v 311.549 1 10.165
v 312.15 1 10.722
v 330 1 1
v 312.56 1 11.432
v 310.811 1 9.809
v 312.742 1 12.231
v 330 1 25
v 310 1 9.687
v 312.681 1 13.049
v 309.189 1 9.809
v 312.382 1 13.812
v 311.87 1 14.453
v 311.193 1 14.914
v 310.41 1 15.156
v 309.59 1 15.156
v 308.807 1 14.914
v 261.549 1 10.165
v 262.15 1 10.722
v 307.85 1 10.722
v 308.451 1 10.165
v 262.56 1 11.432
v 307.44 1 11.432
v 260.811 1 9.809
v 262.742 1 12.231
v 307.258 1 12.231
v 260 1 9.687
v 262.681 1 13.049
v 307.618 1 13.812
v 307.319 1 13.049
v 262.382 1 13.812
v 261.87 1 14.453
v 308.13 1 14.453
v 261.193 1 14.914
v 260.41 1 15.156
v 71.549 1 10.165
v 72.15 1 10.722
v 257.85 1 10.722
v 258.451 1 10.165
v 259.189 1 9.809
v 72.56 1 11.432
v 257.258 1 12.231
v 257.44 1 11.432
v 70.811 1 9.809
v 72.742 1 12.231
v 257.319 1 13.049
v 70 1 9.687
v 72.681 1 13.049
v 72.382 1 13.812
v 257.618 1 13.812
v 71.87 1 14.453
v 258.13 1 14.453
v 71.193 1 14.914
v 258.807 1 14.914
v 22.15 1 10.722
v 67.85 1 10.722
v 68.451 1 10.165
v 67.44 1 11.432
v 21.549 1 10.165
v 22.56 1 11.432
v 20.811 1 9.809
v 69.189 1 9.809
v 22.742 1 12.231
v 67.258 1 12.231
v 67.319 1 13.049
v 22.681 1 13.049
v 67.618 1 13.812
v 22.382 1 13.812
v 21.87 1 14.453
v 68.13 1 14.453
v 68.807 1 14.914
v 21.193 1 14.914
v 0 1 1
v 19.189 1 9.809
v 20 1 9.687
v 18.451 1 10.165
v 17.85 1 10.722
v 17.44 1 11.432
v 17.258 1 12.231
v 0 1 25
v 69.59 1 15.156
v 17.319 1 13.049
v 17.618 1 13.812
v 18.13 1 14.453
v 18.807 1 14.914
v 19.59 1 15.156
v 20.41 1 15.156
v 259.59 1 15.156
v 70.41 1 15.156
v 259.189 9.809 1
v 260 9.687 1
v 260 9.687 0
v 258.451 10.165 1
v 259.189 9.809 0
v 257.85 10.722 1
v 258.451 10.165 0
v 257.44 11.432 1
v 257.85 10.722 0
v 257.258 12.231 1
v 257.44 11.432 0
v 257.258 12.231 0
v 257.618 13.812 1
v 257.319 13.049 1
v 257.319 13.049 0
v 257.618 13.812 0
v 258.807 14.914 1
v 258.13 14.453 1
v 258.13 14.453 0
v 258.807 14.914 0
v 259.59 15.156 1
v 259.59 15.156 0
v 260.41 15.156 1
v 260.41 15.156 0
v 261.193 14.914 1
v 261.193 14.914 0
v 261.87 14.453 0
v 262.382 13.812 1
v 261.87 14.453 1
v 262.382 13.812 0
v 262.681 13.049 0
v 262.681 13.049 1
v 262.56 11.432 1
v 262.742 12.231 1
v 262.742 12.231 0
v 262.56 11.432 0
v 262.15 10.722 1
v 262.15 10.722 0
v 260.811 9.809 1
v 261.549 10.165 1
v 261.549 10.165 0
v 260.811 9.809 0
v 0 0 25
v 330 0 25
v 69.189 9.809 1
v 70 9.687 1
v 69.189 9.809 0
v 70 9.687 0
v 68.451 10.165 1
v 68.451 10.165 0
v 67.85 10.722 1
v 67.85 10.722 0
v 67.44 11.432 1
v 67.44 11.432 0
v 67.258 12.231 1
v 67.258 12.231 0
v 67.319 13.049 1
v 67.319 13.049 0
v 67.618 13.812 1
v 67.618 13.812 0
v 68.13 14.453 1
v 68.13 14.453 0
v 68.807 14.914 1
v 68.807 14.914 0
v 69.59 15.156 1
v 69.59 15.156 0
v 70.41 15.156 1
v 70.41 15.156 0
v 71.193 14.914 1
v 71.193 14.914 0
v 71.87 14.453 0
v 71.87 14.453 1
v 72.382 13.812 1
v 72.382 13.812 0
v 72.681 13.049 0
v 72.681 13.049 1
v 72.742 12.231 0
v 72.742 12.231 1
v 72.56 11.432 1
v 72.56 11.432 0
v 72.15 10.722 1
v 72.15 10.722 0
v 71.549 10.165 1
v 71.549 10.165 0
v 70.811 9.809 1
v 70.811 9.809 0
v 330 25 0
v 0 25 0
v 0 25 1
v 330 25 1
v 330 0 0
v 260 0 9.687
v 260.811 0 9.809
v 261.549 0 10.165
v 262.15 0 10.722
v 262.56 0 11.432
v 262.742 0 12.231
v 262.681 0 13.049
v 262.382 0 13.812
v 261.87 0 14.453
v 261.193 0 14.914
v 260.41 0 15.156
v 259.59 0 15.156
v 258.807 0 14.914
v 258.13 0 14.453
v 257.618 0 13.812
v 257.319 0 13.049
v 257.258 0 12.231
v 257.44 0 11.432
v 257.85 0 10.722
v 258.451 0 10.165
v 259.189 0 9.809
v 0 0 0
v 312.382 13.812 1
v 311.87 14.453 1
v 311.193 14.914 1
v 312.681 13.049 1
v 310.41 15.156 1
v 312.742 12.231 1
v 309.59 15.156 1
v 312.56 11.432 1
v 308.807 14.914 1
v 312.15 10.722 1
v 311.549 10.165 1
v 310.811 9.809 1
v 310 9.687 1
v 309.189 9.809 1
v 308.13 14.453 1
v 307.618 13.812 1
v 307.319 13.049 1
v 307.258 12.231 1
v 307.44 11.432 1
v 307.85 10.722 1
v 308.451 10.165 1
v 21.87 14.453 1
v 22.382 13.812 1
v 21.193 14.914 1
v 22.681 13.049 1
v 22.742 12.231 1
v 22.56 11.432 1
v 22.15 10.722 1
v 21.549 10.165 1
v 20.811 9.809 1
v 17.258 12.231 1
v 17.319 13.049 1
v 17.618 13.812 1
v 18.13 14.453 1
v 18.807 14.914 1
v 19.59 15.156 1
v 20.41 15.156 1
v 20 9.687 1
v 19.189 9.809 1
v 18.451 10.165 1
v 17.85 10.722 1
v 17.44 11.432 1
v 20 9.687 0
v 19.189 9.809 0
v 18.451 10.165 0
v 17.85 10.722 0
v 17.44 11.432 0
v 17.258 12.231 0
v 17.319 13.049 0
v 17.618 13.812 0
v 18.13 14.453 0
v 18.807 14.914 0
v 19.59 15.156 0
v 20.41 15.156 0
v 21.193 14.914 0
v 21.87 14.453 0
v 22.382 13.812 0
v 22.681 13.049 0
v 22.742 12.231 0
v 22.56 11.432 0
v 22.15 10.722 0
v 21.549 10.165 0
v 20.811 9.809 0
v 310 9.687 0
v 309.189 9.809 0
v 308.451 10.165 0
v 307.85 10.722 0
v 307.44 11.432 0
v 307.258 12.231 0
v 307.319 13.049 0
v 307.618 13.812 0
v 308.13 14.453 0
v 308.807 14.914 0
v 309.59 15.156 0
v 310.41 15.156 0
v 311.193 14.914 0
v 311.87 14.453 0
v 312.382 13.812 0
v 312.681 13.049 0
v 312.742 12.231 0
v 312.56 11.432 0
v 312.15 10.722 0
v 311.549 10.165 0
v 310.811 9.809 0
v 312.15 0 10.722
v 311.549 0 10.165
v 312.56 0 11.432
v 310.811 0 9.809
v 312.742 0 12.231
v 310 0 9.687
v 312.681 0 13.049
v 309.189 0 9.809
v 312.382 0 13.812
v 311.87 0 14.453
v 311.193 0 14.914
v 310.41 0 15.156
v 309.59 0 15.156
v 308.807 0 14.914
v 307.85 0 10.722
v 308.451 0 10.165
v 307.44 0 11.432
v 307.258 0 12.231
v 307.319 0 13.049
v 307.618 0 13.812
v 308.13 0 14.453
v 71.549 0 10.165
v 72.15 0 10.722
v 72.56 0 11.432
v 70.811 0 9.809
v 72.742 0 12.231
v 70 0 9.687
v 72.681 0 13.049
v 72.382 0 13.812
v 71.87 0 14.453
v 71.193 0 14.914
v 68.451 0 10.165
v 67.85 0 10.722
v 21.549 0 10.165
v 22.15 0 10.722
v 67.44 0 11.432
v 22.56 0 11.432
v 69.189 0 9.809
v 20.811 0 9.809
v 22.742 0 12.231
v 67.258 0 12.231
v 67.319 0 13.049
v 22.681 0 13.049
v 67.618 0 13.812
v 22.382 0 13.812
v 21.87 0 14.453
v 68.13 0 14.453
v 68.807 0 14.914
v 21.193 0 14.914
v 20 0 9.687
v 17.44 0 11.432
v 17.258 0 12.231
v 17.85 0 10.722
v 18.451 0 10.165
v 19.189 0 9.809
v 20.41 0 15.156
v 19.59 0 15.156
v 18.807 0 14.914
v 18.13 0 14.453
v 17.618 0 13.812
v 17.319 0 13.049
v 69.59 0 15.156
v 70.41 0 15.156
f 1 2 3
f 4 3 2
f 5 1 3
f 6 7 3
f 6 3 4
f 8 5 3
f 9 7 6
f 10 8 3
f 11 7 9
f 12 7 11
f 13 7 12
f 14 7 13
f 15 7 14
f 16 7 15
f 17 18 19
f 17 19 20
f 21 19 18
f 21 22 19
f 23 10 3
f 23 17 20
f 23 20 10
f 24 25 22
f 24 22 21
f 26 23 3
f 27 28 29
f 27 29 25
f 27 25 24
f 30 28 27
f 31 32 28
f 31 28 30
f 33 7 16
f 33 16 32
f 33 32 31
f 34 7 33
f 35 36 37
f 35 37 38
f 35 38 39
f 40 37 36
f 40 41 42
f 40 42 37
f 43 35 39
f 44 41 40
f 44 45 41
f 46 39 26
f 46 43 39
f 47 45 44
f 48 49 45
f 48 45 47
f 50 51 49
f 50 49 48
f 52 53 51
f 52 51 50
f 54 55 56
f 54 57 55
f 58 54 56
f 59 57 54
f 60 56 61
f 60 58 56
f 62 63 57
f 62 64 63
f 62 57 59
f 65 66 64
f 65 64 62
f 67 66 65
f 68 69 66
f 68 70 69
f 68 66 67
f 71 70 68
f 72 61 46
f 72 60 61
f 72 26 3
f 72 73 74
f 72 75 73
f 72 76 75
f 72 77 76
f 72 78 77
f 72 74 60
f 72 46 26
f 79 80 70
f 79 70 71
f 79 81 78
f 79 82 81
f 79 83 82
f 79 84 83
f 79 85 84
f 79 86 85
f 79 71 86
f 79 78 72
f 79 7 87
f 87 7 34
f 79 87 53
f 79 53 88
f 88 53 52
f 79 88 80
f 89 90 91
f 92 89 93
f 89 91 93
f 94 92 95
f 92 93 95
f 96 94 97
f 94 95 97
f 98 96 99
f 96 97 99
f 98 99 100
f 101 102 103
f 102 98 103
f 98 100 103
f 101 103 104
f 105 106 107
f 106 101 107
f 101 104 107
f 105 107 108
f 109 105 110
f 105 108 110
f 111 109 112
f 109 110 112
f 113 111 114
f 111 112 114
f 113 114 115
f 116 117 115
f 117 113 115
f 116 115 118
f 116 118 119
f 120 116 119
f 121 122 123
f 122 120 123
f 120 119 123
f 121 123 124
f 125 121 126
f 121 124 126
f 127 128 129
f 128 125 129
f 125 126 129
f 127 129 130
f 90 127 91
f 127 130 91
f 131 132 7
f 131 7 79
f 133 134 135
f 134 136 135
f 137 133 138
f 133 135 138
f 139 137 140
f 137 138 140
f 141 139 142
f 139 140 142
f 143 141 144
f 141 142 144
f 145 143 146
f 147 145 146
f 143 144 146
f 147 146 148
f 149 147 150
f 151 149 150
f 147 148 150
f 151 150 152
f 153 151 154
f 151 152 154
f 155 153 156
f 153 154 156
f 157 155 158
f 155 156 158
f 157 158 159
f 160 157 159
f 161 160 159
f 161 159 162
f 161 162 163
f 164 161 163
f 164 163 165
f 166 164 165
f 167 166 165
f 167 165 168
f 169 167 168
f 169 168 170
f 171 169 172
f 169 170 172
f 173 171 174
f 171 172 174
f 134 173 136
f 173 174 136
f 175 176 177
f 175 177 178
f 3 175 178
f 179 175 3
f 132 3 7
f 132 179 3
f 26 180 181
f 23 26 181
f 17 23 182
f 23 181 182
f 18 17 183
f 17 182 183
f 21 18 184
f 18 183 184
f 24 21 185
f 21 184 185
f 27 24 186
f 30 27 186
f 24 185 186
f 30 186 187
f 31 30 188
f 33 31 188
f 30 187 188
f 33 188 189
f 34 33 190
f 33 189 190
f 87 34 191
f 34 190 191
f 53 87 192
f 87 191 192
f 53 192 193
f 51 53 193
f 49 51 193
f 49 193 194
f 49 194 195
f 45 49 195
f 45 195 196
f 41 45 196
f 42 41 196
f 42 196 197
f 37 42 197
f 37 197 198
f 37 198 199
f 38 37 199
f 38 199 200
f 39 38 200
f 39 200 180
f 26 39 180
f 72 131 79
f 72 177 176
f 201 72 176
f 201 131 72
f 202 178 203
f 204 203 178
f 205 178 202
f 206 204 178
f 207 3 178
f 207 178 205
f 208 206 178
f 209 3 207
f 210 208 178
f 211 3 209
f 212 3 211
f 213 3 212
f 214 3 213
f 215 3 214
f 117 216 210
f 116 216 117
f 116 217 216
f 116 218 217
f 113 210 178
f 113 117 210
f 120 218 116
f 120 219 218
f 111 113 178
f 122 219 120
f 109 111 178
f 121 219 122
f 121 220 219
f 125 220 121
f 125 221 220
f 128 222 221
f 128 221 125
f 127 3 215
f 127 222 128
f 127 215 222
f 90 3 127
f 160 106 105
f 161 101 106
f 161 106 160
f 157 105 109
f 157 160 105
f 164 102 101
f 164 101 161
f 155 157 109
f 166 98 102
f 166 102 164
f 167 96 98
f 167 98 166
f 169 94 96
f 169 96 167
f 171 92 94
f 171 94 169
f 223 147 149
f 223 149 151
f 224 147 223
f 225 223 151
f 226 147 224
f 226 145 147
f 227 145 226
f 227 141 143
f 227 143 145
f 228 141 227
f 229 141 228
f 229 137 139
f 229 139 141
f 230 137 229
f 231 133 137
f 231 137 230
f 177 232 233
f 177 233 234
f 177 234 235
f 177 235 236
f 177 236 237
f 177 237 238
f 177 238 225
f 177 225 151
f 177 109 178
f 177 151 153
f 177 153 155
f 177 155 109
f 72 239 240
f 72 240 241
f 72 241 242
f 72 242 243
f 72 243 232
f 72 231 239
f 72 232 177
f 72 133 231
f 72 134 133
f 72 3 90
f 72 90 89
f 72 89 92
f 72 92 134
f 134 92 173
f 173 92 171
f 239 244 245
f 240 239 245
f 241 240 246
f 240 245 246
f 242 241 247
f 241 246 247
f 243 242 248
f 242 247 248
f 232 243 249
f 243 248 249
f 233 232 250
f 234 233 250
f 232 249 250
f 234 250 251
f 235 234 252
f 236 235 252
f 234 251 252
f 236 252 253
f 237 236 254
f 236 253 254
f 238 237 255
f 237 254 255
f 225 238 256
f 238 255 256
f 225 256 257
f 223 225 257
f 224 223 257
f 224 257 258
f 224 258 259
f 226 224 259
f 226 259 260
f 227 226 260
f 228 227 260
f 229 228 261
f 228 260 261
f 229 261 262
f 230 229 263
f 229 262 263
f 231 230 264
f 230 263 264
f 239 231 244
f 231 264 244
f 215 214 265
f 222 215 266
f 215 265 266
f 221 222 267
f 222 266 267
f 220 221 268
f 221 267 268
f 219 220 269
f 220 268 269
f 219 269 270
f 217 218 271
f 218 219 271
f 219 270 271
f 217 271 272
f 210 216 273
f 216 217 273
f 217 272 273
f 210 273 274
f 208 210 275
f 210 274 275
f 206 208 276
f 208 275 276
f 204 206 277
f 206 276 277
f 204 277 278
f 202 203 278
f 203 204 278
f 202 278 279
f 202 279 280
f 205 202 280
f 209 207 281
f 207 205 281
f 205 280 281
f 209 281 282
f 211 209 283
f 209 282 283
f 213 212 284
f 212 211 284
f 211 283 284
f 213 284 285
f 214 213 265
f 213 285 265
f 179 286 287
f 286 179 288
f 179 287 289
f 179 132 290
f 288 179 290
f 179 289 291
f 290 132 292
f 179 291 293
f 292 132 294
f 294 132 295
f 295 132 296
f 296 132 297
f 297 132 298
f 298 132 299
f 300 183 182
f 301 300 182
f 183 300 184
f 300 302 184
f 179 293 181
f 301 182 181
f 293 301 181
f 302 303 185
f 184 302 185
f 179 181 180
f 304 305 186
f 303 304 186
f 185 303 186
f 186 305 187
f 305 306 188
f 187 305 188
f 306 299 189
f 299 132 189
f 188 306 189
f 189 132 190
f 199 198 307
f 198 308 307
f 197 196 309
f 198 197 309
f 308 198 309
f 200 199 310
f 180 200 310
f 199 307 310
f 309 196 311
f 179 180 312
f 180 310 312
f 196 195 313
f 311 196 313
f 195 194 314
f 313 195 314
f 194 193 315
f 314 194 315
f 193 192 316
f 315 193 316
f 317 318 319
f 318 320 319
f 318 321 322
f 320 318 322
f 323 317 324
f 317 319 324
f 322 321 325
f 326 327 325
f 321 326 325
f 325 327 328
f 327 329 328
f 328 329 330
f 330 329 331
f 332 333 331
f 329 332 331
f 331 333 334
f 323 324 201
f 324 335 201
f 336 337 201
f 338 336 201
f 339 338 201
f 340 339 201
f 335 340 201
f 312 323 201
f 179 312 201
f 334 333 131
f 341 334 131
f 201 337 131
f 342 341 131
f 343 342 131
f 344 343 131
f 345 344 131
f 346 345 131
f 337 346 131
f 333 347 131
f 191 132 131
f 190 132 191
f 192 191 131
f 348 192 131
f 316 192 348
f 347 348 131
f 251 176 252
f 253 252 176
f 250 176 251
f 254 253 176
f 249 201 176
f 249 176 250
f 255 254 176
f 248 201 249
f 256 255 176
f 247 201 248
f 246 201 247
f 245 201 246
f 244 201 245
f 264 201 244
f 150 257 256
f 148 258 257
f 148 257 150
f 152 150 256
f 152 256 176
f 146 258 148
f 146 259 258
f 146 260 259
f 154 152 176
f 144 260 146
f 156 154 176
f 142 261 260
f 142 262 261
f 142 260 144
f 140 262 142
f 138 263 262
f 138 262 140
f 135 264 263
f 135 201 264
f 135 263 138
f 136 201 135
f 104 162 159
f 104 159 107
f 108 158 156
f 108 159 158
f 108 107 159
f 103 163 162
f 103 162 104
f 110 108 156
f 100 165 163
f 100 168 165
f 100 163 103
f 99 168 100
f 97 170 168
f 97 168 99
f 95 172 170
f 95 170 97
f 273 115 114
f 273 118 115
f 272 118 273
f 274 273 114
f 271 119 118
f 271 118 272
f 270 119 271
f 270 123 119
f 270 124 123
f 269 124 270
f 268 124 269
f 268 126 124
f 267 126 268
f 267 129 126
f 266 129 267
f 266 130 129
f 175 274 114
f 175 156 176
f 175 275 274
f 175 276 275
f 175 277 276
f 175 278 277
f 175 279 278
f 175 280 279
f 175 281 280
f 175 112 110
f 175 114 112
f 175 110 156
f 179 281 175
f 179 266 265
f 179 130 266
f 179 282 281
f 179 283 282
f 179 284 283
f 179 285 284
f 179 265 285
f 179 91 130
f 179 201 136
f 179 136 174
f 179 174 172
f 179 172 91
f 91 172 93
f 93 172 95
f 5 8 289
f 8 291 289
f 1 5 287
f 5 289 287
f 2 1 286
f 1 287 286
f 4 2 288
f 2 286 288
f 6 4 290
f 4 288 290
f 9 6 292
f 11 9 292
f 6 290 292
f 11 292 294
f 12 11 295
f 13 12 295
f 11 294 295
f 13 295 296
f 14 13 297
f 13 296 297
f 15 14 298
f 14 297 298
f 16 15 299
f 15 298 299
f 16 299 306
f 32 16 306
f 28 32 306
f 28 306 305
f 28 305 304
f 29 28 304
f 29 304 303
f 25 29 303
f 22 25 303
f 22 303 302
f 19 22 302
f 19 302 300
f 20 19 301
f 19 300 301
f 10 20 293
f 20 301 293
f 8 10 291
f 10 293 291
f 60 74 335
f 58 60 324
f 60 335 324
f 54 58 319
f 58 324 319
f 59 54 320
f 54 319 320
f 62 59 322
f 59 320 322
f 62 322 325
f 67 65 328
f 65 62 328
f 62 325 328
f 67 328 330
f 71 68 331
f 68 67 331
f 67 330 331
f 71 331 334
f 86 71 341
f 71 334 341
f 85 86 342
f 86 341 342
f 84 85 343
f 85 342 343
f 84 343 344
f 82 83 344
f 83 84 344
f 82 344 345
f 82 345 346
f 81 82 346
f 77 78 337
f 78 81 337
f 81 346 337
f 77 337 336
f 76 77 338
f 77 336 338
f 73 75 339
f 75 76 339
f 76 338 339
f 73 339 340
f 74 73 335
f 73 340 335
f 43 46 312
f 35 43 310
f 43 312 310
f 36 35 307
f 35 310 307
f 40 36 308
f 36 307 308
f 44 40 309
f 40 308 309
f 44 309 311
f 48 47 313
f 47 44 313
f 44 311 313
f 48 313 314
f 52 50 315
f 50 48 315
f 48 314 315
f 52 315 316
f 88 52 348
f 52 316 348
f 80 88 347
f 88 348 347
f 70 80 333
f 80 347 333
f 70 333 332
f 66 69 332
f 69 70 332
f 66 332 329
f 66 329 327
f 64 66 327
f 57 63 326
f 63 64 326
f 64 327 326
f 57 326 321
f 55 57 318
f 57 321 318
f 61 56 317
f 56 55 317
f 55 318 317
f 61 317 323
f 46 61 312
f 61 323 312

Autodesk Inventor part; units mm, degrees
ref_plane "XZ Plane" through (0, 0, 0) normal (0, 1, 0) x (-1, 0, 0)
ref_plane "XY Plane" through (0, 0, 0) normal (0, 0, 1) x (1, 0, 0)
sketch "Sketch1" plane through (0, 0, 0) normal (0, 1, 0) x (-1, 0, 0)
  line L0 (0, 0) -> (-330, 0)
  line L1 (-330, 0) -> (-330, 25)
  line L2 (-330, 25) -> (0, 25)
  line L3 (0, 25) -> (0, 0)
  dimension "d0" = 330
  dimension "d1" = 25
extrude "Extrusion1" add sketch "Sketch1" along normal blind 1
sketch "Sketch2" plane through (0, 1, 0) normal (0, 1, 0) x (1, 0, 0)
  line L0 (0, 0) -> (330, 0)
  line L1 (330, 0) -> (330, -1)
  line L2 (330, -1) -> (0, -1)
  line L3 (0, -1) -> (0, 0)
  dimension "d4" = 330
  dimension "d5" = 1
extrude "Extrusion2" add sketch "Sketch2" along normal blind 24
hole "Hole1" at (20, 12.4367, 1) direction (0, 0, -1) diameter 5.5 end through all
pattern_linear "Rectangular Pattern1" count 2 spacing 50 along (1, 0, 0) of "Hole1"
ref_plane "Work Plane1" through (165, 0, 0) normal (1, 0, 0) x (0, 1, 0)
mirror "Mirror1" about plane through (165, 0, 0) normal (1, 0, 0) of "Hole1", "Rectangular Pattern1"
ref_plane "Work Plane2" through (82.5, 1, 1) normal (0, -0.7071, 0.7071) x (-1, 0, 0)
mirror "Mirror2" about plane through (82.5, 1, 1) normal (0, -0.7071, 0.7071) of "Extrusion2", "Hole1", "Rectangular Pattern1", "Mirror1"
properties part number "Lbarx1 big" material "Aluminum 6061"
